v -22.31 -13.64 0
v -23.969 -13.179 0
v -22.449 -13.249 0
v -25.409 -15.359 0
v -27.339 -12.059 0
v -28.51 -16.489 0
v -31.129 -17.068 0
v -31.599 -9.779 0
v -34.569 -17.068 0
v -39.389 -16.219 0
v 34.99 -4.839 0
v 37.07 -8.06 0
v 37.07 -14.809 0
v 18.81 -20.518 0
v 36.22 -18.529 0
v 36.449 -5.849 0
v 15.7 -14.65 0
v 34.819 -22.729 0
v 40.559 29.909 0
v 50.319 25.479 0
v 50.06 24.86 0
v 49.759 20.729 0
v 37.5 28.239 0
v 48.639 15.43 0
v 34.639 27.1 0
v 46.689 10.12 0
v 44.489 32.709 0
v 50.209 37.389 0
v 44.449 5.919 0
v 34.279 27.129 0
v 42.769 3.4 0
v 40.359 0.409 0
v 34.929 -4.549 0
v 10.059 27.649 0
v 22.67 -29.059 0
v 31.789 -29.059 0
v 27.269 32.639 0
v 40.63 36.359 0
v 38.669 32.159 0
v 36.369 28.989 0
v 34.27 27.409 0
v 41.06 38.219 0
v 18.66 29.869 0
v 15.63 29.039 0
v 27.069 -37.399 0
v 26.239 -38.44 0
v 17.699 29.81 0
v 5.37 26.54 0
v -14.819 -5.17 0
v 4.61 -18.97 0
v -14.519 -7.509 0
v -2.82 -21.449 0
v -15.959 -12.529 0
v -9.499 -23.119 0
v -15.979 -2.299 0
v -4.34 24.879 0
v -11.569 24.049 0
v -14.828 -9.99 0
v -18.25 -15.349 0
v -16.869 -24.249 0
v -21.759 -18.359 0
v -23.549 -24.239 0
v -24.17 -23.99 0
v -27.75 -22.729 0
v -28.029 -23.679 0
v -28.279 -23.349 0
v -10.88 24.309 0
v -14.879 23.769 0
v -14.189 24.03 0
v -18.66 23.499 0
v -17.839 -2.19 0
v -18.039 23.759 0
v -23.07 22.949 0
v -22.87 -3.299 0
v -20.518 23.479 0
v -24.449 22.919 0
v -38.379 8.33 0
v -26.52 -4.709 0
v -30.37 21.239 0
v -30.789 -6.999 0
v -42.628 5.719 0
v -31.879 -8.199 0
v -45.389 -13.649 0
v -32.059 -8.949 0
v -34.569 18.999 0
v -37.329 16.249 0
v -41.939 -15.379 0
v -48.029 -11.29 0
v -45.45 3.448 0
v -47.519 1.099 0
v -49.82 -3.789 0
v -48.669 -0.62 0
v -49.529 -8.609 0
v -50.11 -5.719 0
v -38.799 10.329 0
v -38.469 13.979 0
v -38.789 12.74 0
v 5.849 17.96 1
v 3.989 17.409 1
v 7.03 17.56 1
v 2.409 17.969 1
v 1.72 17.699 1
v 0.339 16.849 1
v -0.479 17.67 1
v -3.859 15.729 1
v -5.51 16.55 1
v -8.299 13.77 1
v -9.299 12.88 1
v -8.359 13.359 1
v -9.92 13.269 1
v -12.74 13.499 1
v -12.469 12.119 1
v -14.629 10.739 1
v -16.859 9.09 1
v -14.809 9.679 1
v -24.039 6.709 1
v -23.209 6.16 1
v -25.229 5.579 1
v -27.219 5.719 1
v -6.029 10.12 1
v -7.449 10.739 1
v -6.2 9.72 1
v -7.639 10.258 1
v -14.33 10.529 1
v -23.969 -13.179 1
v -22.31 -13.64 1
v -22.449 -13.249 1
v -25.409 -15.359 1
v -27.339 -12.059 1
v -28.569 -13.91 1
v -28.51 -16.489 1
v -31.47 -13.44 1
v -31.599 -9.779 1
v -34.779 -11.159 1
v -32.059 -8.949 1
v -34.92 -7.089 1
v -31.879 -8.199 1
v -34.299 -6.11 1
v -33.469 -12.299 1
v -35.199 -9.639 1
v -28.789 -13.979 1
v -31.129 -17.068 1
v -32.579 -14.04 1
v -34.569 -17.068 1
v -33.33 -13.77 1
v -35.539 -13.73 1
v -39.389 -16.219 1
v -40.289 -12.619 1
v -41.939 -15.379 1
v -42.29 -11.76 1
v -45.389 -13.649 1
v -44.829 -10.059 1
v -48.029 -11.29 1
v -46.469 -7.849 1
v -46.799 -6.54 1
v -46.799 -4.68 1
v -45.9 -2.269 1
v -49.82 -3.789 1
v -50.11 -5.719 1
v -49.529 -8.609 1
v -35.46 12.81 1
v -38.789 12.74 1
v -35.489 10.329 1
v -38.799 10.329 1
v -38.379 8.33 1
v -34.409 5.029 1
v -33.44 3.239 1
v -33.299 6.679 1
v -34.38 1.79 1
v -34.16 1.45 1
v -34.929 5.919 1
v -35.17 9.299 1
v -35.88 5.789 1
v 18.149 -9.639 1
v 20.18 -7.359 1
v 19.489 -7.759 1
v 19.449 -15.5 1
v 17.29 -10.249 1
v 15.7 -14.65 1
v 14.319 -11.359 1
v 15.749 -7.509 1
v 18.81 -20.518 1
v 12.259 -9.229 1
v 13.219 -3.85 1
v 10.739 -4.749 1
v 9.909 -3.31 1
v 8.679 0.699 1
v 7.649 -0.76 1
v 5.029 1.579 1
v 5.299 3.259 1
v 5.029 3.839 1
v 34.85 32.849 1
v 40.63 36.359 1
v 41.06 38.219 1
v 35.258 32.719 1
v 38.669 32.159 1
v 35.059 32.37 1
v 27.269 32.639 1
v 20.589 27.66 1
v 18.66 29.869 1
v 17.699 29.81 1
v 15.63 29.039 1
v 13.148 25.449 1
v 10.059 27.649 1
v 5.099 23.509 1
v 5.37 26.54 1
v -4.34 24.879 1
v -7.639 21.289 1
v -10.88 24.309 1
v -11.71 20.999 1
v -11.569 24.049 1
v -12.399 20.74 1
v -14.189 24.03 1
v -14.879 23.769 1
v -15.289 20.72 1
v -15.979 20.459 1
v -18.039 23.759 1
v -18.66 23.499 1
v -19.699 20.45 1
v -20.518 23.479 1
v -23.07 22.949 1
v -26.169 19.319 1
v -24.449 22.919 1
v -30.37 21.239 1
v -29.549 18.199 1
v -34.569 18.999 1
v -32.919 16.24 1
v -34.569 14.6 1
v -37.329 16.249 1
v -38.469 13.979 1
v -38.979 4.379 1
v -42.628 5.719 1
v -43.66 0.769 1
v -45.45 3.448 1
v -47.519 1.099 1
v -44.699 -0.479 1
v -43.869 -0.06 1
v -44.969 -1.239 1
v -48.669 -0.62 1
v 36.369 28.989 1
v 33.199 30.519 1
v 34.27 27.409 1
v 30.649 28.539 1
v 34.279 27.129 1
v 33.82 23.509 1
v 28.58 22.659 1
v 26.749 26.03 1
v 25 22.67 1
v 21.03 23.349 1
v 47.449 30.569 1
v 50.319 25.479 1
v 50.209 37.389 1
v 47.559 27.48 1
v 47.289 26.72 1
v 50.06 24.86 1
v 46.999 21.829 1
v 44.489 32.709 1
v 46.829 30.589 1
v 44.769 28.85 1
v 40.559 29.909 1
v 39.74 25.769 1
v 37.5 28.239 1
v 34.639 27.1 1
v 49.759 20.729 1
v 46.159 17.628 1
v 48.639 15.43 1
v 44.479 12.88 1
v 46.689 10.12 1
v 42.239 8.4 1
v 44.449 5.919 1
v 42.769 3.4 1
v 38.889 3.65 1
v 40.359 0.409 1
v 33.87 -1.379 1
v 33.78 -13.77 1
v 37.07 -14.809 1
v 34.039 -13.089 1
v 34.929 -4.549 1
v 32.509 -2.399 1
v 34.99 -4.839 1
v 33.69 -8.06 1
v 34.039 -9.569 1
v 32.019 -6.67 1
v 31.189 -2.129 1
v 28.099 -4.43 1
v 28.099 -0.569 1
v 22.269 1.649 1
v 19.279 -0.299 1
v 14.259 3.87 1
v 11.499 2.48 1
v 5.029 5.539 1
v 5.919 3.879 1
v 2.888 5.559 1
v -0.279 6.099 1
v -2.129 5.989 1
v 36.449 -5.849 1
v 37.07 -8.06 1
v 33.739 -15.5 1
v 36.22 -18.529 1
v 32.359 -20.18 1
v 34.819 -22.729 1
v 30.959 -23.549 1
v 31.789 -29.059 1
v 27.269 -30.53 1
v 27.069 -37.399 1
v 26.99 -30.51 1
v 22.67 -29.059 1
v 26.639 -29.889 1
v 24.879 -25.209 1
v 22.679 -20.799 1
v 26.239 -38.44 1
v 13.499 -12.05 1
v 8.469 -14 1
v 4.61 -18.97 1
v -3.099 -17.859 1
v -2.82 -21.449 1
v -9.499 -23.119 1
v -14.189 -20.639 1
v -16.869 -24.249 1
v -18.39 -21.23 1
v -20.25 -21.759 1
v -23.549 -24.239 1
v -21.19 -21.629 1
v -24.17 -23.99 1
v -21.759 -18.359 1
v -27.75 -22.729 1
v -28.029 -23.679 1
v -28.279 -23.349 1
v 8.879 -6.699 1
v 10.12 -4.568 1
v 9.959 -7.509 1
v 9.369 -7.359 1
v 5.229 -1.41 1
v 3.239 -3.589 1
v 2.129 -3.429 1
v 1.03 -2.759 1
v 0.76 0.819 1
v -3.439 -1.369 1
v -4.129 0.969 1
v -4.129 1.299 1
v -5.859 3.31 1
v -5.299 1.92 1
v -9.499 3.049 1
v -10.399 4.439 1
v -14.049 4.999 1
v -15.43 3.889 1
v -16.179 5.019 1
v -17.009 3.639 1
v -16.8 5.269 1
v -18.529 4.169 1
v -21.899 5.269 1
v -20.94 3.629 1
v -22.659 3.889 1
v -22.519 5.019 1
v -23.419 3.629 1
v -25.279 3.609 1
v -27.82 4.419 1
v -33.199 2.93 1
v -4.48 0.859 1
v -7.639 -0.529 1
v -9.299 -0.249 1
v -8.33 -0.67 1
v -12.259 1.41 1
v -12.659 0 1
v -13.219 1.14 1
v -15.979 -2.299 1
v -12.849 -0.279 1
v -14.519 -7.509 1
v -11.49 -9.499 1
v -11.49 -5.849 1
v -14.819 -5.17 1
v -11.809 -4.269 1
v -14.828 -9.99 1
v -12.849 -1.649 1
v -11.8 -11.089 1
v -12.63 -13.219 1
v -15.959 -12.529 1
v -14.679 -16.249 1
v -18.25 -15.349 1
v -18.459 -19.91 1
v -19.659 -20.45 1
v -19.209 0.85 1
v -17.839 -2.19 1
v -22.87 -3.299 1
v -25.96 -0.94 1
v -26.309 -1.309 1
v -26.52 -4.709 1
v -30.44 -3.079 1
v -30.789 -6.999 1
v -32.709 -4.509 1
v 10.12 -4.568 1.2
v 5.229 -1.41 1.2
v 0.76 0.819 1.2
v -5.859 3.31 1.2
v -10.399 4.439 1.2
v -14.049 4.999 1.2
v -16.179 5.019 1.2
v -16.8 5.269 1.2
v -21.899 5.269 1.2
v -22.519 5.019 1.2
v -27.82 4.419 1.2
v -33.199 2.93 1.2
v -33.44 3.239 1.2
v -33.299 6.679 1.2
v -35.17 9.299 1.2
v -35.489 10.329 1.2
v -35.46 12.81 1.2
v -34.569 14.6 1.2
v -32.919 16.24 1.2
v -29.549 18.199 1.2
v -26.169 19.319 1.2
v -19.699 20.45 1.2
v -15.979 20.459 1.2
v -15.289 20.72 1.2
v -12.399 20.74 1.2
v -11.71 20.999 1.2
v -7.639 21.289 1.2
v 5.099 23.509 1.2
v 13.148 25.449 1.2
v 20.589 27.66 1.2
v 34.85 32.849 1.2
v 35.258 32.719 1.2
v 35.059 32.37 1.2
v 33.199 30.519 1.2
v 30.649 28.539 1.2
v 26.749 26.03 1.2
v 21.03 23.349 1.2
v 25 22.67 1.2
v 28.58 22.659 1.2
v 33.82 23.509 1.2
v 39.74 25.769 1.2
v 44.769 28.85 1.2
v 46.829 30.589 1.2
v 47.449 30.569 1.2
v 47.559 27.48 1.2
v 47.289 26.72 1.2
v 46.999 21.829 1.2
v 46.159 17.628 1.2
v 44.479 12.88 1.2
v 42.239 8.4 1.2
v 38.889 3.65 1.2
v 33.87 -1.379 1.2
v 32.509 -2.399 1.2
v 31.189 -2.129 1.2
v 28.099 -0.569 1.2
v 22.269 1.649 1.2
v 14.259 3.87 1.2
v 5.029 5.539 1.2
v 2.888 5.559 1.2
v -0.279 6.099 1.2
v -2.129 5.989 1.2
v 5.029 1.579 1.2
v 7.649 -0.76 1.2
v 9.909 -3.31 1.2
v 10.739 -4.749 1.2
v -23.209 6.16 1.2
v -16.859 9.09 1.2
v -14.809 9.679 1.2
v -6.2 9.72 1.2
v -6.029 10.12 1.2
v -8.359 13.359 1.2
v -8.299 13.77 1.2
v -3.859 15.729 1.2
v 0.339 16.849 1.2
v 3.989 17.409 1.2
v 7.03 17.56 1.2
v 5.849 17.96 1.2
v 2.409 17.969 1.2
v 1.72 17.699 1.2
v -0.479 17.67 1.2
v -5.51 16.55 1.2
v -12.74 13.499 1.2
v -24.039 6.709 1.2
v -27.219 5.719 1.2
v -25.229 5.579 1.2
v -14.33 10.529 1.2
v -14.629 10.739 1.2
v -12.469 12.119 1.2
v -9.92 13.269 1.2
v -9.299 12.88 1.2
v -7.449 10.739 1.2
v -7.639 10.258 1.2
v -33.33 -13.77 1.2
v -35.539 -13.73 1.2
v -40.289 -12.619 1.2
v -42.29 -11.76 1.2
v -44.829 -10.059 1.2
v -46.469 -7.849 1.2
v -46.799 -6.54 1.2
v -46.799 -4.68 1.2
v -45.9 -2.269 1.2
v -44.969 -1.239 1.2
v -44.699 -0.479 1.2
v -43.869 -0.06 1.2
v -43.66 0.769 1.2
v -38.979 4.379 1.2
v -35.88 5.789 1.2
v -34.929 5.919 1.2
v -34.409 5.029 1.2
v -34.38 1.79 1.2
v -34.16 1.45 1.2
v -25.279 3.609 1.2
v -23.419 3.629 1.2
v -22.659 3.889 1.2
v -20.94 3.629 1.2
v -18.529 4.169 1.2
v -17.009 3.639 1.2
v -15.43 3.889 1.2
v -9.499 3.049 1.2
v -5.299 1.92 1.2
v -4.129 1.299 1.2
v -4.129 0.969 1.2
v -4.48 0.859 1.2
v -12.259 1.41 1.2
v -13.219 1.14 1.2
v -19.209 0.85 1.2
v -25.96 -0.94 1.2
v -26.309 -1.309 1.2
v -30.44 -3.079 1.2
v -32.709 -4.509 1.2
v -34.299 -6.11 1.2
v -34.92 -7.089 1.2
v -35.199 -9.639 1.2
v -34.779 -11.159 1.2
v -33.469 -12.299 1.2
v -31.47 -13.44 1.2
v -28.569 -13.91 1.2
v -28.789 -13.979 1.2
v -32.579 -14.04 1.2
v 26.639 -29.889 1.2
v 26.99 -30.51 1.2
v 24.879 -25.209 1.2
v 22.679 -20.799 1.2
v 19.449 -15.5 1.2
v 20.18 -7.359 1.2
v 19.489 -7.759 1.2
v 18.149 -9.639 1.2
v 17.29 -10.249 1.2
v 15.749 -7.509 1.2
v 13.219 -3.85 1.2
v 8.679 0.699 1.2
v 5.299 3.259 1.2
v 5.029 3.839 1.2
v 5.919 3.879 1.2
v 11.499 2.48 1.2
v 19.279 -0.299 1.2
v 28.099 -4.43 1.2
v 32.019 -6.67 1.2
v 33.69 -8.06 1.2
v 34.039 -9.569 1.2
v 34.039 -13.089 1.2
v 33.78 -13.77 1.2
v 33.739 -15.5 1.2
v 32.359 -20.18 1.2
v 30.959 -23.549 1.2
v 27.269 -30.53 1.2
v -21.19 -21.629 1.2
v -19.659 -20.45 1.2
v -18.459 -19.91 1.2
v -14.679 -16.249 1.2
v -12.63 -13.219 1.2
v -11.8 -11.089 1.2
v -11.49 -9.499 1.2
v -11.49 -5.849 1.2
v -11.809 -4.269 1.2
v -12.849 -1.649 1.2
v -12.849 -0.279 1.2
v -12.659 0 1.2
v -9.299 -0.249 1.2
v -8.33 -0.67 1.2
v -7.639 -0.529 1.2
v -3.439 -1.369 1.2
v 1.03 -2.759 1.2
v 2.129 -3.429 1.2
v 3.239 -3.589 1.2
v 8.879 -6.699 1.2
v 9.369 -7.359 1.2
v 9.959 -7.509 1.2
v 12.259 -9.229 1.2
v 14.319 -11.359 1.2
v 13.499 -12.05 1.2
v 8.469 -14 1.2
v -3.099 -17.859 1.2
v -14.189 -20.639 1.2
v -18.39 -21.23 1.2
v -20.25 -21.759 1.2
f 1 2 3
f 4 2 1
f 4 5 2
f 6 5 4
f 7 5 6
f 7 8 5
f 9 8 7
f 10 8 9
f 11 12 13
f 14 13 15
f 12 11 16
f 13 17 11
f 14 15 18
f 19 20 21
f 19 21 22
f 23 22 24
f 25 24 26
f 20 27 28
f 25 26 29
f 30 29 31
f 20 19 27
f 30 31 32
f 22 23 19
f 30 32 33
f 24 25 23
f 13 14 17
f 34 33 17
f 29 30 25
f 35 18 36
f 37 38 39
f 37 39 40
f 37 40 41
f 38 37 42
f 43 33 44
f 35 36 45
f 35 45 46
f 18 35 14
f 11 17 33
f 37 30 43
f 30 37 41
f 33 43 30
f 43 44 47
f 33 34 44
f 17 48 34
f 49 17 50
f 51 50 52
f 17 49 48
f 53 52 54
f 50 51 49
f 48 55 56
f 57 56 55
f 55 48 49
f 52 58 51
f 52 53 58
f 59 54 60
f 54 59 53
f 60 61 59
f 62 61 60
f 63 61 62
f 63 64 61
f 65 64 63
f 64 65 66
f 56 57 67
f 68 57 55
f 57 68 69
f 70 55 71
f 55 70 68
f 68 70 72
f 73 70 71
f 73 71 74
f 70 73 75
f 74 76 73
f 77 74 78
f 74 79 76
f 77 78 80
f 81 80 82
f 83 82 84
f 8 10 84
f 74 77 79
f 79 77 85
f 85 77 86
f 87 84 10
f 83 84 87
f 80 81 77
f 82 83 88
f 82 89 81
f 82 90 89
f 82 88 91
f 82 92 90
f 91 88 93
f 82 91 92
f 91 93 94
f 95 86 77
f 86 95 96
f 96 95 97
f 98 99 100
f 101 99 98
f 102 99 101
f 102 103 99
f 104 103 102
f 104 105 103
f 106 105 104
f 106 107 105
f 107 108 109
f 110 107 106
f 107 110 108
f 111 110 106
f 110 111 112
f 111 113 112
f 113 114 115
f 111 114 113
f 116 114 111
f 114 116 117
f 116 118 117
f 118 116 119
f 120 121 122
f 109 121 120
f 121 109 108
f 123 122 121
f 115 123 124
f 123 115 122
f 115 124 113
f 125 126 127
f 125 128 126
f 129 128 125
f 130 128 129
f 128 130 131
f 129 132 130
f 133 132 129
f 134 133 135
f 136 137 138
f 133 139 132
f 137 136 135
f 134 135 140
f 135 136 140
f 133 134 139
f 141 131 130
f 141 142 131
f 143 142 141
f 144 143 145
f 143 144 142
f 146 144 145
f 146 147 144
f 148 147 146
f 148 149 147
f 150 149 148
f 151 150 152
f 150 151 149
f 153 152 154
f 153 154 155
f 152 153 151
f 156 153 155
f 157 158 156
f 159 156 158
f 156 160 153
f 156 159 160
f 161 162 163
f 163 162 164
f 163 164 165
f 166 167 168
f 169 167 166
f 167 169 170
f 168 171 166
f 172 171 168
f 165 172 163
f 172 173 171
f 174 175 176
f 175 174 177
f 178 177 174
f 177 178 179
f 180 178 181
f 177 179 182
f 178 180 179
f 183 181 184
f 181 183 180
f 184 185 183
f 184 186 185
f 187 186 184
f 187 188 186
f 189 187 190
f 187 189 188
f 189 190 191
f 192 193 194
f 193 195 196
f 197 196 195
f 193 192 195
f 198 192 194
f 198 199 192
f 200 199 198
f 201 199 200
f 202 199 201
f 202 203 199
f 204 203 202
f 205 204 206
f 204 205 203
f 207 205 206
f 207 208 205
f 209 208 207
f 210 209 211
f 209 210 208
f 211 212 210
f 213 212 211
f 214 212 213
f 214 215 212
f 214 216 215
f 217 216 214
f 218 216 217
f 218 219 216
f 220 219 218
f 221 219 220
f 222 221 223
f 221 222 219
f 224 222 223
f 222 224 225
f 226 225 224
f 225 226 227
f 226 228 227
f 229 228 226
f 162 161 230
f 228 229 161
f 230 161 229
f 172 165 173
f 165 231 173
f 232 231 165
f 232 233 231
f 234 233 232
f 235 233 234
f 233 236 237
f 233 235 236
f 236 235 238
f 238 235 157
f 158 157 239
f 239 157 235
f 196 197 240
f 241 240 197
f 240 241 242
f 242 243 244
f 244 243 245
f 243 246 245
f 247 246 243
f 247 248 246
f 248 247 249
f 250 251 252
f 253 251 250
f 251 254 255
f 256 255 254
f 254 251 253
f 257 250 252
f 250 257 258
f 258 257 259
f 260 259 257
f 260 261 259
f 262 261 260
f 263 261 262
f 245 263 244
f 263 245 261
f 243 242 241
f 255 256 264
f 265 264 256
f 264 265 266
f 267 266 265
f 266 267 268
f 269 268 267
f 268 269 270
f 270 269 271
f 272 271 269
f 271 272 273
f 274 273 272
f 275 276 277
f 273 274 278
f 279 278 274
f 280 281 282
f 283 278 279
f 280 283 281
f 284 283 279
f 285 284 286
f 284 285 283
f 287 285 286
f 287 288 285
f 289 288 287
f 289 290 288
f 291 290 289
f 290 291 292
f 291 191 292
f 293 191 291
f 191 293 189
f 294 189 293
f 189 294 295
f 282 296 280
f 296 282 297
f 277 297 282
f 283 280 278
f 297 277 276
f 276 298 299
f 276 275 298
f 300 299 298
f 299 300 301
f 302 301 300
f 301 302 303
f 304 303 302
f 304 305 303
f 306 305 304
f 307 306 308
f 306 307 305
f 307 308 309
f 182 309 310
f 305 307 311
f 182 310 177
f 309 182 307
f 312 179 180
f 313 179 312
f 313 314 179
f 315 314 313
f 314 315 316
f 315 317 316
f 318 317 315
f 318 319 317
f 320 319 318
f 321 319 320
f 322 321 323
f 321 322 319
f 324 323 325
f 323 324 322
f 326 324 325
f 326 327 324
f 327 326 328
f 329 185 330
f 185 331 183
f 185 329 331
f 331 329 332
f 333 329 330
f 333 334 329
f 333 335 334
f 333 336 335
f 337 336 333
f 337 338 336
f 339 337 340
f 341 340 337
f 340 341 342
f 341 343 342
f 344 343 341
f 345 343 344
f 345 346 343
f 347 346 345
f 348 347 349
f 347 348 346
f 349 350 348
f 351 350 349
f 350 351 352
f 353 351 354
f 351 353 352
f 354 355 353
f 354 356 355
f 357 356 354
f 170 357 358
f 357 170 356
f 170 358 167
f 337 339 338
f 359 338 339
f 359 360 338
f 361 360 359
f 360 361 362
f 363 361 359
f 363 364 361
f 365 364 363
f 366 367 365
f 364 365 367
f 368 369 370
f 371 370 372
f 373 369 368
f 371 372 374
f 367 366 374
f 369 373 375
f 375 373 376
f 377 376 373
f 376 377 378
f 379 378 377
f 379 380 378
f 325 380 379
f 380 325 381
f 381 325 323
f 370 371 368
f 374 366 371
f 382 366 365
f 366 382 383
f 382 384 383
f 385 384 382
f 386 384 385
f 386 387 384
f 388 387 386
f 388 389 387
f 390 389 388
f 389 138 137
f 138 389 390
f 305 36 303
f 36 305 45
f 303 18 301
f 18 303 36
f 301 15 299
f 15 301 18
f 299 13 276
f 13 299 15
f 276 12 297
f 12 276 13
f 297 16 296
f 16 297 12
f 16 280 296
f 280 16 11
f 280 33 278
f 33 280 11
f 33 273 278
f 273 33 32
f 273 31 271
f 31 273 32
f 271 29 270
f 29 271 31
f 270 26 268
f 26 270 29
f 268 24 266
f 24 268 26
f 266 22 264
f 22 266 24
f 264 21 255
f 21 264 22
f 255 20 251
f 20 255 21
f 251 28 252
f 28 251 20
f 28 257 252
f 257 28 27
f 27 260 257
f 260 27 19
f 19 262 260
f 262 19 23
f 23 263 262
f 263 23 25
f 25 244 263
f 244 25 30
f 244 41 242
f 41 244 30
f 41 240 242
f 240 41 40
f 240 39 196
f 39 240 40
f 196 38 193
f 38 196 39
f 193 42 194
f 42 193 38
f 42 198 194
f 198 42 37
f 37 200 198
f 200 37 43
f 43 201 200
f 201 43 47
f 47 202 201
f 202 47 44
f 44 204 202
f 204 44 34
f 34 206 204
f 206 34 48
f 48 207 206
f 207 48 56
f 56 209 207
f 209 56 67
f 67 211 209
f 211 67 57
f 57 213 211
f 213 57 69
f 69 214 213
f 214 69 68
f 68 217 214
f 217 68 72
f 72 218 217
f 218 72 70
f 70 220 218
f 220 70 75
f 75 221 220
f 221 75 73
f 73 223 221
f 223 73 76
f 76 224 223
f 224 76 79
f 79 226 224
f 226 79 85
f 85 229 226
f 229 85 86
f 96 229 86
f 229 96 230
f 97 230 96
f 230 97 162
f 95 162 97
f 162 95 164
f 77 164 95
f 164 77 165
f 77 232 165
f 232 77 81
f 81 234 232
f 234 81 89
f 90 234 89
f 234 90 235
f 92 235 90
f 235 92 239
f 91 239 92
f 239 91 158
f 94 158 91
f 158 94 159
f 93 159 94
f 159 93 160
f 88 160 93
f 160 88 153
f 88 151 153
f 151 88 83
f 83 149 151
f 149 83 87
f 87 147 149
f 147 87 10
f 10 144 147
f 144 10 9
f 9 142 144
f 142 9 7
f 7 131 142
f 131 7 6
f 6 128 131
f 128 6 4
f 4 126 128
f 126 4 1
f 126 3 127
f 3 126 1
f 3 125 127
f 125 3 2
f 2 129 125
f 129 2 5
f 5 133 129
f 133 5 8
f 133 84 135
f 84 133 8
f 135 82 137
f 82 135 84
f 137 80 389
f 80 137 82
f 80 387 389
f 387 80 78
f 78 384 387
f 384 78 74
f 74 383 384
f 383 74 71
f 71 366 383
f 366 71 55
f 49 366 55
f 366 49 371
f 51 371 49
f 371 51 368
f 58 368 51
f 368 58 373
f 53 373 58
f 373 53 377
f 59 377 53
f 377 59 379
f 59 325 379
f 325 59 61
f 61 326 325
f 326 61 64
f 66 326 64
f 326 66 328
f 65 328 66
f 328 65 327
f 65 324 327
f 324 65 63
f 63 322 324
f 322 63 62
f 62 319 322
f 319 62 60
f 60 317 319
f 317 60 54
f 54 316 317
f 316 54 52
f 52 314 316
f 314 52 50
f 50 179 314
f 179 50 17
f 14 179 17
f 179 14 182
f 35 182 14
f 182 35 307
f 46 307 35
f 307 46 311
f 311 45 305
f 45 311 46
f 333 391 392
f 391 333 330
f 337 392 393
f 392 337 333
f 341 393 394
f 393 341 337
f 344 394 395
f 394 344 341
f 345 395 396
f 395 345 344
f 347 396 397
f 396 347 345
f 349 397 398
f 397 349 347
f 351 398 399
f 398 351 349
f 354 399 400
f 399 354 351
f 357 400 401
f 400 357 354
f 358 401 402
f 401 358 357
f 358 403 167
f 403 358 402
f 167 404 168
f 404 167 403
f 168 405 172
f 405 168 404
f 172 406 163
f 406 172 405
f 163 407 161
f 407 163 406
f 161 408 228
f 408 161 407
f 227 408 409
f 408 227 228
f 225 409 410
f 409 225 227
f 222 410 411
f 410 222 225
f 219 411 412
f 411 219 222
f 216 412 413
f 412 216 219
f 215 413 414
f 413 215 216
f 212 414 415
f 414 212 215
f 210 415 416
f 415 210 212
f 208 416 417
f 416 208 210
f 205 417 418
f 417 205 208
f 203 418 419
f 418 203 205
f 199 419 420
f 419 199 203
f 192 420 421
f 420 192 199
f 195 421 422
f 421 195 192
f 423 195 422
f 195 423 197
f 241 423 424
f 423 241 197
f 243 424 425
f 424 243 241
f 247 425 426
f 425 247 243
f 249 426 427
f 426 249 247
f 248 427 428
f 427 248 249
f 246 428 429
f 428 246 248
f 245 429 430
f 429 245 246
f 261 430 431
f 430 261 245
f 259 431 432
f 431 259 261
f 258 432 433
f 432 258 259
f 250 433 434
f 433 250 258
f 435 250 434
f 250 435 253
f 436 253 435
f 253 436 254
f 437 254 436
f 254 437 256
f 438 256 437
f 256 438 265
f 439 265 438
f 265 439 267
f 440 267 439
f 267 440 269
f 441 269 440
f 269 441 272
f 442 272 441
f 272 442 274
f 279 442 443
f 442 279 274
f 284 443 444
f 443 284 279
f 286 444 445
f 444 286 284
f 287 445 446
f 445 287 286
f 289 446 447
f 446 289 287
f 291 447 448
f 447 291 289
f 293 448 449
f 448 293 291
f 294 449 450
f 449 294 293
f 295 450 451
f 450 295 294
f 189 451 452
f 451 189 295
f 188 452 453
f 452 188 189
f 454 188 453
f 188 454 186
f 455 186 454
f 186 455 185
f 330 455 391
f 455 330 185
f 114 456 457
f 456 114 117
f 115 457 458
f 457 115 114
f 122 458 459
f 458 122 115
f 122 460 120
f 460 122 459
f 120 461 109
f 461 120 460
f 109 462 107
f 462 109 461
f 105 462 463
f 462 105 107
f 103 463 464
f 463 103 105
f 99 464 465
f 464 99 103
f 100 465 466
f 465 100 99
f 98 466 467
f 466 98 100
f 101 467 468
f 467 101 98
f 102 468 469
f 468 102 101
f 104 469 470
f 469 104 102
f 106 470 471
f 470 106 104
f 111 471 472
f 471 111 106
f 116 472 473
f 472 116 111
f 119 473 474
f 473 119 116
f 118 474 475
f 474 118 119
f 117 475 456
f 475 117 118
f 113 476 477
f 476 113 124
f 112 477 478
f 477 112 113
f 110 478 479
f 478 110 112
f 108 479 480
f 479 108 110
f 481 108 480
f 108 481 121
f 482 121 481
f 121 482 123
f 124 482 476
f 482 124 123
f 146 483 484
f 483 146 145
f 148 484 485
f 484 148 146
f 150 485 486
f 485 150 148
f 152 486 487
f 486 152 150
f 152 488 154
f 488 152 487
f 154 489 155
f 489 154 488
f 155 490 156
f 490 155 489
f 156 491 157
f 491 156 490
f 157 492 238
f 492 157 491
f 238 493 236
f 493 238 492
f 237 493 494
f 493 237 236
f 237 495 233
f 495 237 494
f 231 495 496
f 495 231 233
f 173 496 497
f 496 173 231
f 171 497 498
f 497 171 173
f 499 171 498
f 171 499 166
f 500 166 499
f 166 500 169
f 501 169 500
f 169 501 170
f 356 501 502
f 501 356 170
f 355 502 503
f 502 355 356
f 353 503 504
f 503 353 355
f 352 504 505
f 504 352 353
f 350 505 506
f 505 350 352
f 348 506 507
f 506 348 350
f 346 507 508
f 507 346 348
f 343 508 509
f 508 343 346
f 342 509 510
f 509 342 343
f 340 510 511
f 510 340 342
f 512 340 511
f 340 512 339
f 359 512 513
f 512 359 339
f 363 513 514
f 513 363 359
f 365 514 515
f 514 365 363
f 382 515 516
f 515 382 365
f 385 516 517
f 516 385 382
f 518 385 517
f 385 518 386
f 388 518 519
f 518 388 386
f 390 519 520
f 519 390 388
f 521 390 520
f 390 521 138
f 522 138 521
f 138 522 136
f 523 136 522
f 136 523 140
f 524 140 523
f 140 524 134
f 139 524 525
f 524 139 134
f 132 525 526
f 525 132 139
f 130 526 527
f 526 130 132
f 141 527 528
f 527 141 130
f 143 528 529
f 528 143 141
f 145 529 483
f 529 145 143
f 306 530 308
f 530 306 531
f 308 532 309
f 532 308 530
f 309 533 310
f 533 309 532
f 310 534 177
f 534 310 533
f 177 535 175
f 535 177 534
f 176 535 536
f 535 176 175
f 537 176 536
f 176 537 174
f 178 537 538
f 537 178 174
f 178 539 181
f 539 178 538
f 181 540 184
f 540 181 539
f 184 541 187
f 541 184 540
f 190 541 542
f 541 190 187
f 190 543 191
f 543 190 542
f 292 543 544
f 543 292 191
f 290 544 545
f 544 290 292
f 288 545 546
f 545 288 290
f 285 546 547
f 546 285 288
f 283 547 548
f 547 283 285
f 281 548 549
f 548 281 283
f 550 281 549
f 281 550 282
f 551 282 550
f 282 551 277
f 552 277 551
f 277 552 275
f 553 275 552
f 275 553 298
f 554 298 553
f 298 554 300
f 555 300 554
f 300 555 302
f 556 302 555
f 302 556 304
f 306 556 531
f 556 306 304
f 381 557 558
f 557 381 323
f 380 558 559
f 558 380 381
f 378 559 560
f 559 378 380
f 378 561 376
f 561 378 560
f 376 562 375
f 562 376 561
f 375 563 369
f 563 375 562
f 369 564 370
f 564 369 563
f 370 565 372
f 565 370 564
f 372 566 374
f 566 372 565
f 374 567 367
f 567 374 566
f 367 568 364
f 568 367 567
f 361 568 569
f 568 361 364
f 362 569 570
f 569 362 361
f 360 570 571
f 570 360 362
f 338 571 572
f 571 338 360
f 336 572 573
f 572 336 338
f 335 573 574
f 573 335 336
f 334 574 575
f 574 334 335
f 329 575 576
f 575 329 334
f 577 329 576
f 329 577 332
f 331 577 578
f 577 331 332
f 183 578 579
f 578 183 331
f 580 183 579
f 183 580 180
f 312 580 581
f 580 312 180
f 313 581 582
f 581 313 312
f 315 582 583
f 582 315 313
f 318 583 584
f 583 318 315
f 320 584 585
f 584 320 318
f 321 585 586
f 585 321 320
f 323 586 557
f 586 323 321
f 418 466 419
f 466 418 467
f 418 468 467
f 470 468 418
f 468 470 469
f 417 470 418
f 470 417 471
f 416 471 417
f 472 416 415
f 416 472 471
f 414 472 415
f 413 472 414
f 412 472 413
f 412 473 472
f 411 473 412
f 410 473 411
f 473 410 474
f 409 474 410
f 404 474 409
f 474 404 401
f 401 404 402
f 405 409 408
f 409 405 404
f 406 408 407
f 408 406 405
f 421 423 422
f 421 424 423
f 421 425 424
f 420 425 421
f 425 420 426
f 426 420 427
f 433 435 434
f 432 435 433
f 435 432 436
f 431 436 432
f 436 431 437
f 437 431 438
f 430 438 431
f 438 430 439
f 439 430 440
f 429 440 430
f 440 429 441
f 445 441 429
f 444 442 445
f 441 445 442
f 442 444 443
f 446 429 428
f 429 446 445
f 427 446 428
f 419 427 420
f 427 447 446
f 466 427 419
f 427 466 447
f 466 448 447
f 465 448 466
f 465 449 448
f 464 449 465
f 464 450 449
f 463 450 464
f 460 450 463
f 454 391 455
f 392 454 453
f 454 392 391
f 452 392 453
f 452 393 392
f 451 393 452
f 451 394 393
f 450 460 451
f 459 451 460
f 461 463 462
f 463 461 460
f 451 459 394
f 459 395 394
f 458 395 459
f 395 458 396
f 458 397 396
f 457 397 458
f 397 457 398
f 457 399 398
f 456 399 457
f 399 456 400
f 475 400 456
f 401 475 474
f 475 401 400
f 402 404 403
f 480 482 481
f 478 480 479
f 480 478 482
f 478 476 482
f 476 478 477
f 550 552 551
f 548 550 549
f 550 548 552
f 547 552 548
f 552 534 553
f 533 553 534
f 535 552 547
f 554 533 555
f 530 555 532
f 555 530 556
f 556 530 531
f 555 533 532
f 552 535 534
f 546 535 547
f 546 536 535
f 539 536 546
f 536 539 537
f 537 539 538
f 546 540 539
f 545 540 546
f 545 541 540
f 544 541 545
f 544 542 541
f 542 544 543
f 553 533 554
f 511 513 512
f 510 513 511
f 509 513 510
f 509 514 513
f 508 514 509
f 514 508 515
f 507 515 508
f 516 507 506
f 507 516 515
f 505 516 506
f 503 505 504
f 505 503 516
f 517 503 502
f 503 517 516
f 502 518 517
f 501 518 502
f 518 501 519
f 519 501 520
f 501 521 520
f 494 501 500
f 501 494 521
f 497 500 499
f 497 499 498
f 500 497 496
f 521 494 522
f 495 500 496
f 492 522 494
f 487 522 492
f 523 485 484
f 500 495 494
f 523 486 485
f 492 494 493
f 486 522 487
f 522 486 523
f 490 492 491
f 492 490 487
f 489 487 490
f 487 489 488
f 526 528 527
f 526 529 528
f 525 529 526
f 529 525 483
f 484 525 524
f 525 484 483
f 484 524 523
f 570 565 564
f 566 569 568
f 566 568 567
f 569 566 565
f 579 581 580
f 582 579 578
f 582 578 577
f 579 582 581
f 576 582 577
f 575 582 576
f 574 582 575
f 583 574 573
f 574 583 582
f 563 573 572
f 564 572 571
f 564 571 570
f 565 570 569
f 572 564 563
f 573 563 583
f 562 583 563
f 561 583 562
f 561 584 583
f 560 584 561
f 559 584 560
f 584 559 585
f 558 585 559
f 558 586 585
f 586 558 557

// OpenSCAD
// file: eagle_logo.scad
// Eagle-head logo, traced from the supplied artwork.
// Unit box: 1.0 wide, centred on the origin, y up.  Height / width = 0.766
LOGO_ASPECT = 0.7658;
LOGO_SIL = [
  [[0.2624,-0.3844],[0.2267,-0.2906],[0.1881,-0.2052],[0.1570,-0.1465],[0.0461,-0.1897],[-0.0282,-0.2145],[-0.0950,-0.2312],[-0.1687,-0.2425],[-0.2355,-0.2424],[-0.2417,-0.2399],[-0.2803,-0.2368],[-0.2828,-0.2335],[-0.2775,-0.2273],[-0.2176,-0.1836],[-0.1825,-0.1535],[-0.1596,-0.1253],[-0.1483,-0.0999],[-0.1452,-0.0751],[-0.1482,-0.0517],[-0.1598,-0.0230],[-0.1784,-0.0219],[-0.2287,-0.0330],[-0.2652,-0.0471],[-0.3079,-0.0700],[-0.3188,-0.0820],[-0.3206,-0.0895],[-0.3160,-0.0978],[-0.2734,-0.1206],[-0.2397,-0.1318],[-0.2245,-0.1325],[-0.2231,-0.1364],[-0.2541,-0.1536],[-0.2851,-0.1649],[-0.3113,-0.1707],[-0.3457,-0.1707],[-0.3939,-0.1622],[-0.4194,-0.1538],[-0.4539,-0.1365],[-0.4803,-0.1129],[-0.4953,-0.0861],[-0.5011,-0.0572],[-0.4982,-0.0379],[-0.4867,-0.0062],[-0.4752,0.0110],[-0.4545,0.0345],[-0.4263,0.0572],[-0.3838,0.0833],[-0.3880,0.1033],[-0.3879,0.1274],[-0.3847,0.1398],[-0.3733,0.1625],[-0.3457,0.1900],[-0.3037,0.2124],[-0.2445,0.2292],[-0.2307,0.2295],[-0.2052,0.2348],[-0.1866,0.2350],[-0.1804,0.2376],[-0.1488,0.2377],[-0.1419,0.2403],[-0.1157,0.2405],[-0.1088,0.2431],[-0.0434,0.2488],[0.0537,0.2654],[0.1006,0.2765],[0.1563,0.2904],[0.1770,0.2981],[0.1866,0.2987],[0.2727,0.3264],[0.4106,0.3822],[0.4063,0.3636],[0.3867,0.3216],[0.3637,0.2899],[0.3427,0.2741],[0.3428,0.2713],[0.3464,0.2710],[0.3750,0.2824],[0.4056,0.2991],[0.4449,0.3271],[0.5021,0.3739],[0.5032,0.2548],[0.5006,0.2486],[0.4976,0.2073],[0.4864,0.1543],[0.4669,0.1012],[0.4445,0.0592],[0.4277,0.0340],[0.4036,0.0041],[0.3493,-0.0455],[0.3499,-0.0484],[0.3645,-0.0585],[0.3707,-0.0806],[0.3707,-0.1481],[0.3622,-0.1853],[0.3482,-0.2273],[0.3179,-0.2906],[0.2707,-0.3740]]
];
LOGO_WHITE = [
  [[0.1074,-0.0475],[0.1012,-0.0457],[0.0523,-0.0141],[0.0076,0.0082],[-0.0586,0.0331],[-0.1040,0.0444],[-0.1405,0.0500],[-0.1618,0.0502],[-0.1680,0.0527],[-0.2190,0.0527],[-0.2252,0.0502],[-0.2782,0.0442],[-0.3320,0.0293],[-0.3344,0.0324],[-0.3330,0.0668],[-0.3517,0.0930],[-0.3549,0.1033],[-0.3546,0.1281],[-0.3457,0.1460],[-0.3292,0.1624],[-0.2955,0.1820],[-0.2617,0.1932],[-0.1970,0.2045],[-0.1598,0.2046],[-0.1529,0.2072],[-0.1240,0.2074],[-0.1171,0.2100],[-0.0764,0.2129],[0.0510,0.2351],[0.1315,0.2545],[0.2059,0.2766],[0.3485,0.3285],[0.3526,0.3272],[0.3506,0.3237],[0.3320,0.3052],[0.3065,0.2854],[0.2675,0.2603],[0.2103,0.2335],[0.2500,0.2267],[0.2858,0.2266],[0.3382,0.2351],[0.3974,0.2577],[0.4477,0.2885],[0.4683,0.3059],[0.4745,0.3057],[0.4756,0.2748],[0.4729,0.2672],[0.4700,0.2183],[0.4616,0.1763],[0.4448,0.1288],[0.4224,0.0840],[0.3889,0.0365],[0.3387,-0.0138],[0.3251,-0.0240],[0.3119,-0.0213],[0.2810,-0.0057],[0.2227,0.0165],[0.1426,0.0387],[0.0503,0.0554],[0.0289,0.0556],[-0.0028,0.0610],[-0.0213,0.0599],[0.0503,0.0158],[0.0765,-0.0076],[0.0991,-0.0331]],
  [[-0.2523,0.0558],[-0.2321,0.0616],[-0.1686,0.0909],[-0.1481,0.0968],[-0.0620,0.0972],[-0.0603,0.1012],[-0.0836,0.1336],[-0.0830,0.1377],[-0.0386,0.1573],[0.0034,0.1685],[0.0399,0.1741],[0.0703,0.1756],[0.0585,0.1796],[0.0241,0.1797],[0.0172,0.1770],[-0.0048,0.1767],[-0.0551,0.1655],[-0.1274,0.1350],[-0.2404,0.0671],[-0.2722,0.0572]],
  [[-0.0764,0.1026],[-0.1433,0.1053],[-0.1463,0.1074],[-0.1247,0.1212],[-0.0992,0.1327],[-0.0930,0.1288],[-0.0745,0.1074]],
  [[0.2727,-0.3053],[0.2699,-0.3051],[0.2664,-0.2989],[0.2488,-0.2521],[0.2268,-0.2080],[0.1945,-0.1550],[0.2018,-0.0736],[0.1949,-0.0776],[0.1815,-0.0964],[0.1729,-0.1025],[0.1575,-0.0751],[0.1322,-0.0385],[0.0868,0.0070],[0.0530,0.0326],[0.0503,0.0384],[0.0592,0.0388],[0.1150,0.0248],[0.1928,-0.0030],[0.2810,-0.0443],[0.3202,-0.0667],[0.3369,-0.0806],[0.3404,-0.0957],[0.3404,-0.1309],[0.3378,-0.1377],[0.3374,-0.1550],[0.3236,-0.2018],[0.3096,-0.2355]]
];
LOGO_GOLD = [
  [[-0.2879,-0.1398],[-0.3258,-0.1404],[-0.3333,-0.1377],[-0.3554,-0.1373],[-0.4029,-0.1262],[-0.4229,-0.1176],[-0.4483,-0.1006],[-0.4647,-0.0785],[-0.4680,-0.0654],[-0.4680,-0.0468],[-0.4590,-0.0227],[-0.4497,-0.0124],[-0.4470,-0.0048],[-0.4387,-0.0006],[-0.4366,0.0077],[-0.3898,0.0438],[-0.3588,0.0579],[-0.3493,0.0592],[-0.3441,0.0503],[-0.3438,0.0179],[-0.3416,0.0145],[-0.2528,0.0361],[-0.2342,0.0363],[-0.2266,0.0389],[-0.2094,0.0363],[-0.1853,0.0417],[-0.1701,0.0364],[-0.1543,0.0389],[-0.0950,0.0305],[-0.0530,0.0192],[-0.0413,0.0130],[-0.0413,0.0097],[-0.0448,0.0086],[-0.1226,0.0141],[-0.1322,0.0114],[-0.1921,0.0085],[-0.2596,-0.0094],[-0.2631,-0.0131],[-0.3044,-0.0308],[-0.3271,-0.0451],[-0.3430,-0.0611],[-0.3492,-0.0709],[-0.3520,-0.0964],[-0.3478,-0.1116],[-0.3347,-0.1230],[-0.3147,-0.1344],[-0.2857,-0.1391]],
  [[-0.2025,-0.2176],[-0.2119,-0.2163],[-0.1966,-0.2045],[-0.1846,-0.1991],[-0.1468,-0.1625],[-0.1263,-0.1322],[-0.1180,-0.1109],[-0.1149,-0.0950],[-0.1149,-0.0585],[-0.1181,-0.0427],[-0.1285,-0.0165],[-0.1285,-0.0028],[-0.1266,-0.0000],[-0.0930,-0.0025],[-0.0833,-0.0067],[-0.0764,-0.0053],[-0.0344,-0.0137],[0.0103,-0.0276],[0.0213,-0.0343],[0.0324,-0.0359],[0.0888,-0.0670],[0.0937,-0.0736],[0.0996,-0.0751],[0.1226,-0.0923],[0.1432,-0.1136],[0.1350,-0.1205],[0.0847,-0.1400],[-0.0310,-0.1786],[-0.1419,-0.2064],[-0.1839,-0.2123]]
];

// each set is a list of closed outlines; nested outlines are holes (even-odd)
module logo_set(set) {
    pts   = [for (p = set) each p];
    start = [for (i = [0:len(set)-1]) i == 0 ? 0 : len([for (j = [0:i-1]) each set[j]])];
    polygon(pts, [for (i = [0:len(set)-1]) [for (k = [0:len(set[i])-1]) start[i] + k]]);
}
// main file
include <eagle_logo.scad>
s = 100;
color("#1E2A52") linear_extrude(1) scale(s) difference() { logo_set(LOGO_SIL); logo_set(LOGO_WHITE); logo_set(LOGO_GOLD); }
color("#F4F4EE") linear_extrude(1.2) scale(s) logo_set(LOGO_WHITE);
color("#F2C12E") linear_extrude(1.2) scale(s) logo_set(LOGO_GOLD);
